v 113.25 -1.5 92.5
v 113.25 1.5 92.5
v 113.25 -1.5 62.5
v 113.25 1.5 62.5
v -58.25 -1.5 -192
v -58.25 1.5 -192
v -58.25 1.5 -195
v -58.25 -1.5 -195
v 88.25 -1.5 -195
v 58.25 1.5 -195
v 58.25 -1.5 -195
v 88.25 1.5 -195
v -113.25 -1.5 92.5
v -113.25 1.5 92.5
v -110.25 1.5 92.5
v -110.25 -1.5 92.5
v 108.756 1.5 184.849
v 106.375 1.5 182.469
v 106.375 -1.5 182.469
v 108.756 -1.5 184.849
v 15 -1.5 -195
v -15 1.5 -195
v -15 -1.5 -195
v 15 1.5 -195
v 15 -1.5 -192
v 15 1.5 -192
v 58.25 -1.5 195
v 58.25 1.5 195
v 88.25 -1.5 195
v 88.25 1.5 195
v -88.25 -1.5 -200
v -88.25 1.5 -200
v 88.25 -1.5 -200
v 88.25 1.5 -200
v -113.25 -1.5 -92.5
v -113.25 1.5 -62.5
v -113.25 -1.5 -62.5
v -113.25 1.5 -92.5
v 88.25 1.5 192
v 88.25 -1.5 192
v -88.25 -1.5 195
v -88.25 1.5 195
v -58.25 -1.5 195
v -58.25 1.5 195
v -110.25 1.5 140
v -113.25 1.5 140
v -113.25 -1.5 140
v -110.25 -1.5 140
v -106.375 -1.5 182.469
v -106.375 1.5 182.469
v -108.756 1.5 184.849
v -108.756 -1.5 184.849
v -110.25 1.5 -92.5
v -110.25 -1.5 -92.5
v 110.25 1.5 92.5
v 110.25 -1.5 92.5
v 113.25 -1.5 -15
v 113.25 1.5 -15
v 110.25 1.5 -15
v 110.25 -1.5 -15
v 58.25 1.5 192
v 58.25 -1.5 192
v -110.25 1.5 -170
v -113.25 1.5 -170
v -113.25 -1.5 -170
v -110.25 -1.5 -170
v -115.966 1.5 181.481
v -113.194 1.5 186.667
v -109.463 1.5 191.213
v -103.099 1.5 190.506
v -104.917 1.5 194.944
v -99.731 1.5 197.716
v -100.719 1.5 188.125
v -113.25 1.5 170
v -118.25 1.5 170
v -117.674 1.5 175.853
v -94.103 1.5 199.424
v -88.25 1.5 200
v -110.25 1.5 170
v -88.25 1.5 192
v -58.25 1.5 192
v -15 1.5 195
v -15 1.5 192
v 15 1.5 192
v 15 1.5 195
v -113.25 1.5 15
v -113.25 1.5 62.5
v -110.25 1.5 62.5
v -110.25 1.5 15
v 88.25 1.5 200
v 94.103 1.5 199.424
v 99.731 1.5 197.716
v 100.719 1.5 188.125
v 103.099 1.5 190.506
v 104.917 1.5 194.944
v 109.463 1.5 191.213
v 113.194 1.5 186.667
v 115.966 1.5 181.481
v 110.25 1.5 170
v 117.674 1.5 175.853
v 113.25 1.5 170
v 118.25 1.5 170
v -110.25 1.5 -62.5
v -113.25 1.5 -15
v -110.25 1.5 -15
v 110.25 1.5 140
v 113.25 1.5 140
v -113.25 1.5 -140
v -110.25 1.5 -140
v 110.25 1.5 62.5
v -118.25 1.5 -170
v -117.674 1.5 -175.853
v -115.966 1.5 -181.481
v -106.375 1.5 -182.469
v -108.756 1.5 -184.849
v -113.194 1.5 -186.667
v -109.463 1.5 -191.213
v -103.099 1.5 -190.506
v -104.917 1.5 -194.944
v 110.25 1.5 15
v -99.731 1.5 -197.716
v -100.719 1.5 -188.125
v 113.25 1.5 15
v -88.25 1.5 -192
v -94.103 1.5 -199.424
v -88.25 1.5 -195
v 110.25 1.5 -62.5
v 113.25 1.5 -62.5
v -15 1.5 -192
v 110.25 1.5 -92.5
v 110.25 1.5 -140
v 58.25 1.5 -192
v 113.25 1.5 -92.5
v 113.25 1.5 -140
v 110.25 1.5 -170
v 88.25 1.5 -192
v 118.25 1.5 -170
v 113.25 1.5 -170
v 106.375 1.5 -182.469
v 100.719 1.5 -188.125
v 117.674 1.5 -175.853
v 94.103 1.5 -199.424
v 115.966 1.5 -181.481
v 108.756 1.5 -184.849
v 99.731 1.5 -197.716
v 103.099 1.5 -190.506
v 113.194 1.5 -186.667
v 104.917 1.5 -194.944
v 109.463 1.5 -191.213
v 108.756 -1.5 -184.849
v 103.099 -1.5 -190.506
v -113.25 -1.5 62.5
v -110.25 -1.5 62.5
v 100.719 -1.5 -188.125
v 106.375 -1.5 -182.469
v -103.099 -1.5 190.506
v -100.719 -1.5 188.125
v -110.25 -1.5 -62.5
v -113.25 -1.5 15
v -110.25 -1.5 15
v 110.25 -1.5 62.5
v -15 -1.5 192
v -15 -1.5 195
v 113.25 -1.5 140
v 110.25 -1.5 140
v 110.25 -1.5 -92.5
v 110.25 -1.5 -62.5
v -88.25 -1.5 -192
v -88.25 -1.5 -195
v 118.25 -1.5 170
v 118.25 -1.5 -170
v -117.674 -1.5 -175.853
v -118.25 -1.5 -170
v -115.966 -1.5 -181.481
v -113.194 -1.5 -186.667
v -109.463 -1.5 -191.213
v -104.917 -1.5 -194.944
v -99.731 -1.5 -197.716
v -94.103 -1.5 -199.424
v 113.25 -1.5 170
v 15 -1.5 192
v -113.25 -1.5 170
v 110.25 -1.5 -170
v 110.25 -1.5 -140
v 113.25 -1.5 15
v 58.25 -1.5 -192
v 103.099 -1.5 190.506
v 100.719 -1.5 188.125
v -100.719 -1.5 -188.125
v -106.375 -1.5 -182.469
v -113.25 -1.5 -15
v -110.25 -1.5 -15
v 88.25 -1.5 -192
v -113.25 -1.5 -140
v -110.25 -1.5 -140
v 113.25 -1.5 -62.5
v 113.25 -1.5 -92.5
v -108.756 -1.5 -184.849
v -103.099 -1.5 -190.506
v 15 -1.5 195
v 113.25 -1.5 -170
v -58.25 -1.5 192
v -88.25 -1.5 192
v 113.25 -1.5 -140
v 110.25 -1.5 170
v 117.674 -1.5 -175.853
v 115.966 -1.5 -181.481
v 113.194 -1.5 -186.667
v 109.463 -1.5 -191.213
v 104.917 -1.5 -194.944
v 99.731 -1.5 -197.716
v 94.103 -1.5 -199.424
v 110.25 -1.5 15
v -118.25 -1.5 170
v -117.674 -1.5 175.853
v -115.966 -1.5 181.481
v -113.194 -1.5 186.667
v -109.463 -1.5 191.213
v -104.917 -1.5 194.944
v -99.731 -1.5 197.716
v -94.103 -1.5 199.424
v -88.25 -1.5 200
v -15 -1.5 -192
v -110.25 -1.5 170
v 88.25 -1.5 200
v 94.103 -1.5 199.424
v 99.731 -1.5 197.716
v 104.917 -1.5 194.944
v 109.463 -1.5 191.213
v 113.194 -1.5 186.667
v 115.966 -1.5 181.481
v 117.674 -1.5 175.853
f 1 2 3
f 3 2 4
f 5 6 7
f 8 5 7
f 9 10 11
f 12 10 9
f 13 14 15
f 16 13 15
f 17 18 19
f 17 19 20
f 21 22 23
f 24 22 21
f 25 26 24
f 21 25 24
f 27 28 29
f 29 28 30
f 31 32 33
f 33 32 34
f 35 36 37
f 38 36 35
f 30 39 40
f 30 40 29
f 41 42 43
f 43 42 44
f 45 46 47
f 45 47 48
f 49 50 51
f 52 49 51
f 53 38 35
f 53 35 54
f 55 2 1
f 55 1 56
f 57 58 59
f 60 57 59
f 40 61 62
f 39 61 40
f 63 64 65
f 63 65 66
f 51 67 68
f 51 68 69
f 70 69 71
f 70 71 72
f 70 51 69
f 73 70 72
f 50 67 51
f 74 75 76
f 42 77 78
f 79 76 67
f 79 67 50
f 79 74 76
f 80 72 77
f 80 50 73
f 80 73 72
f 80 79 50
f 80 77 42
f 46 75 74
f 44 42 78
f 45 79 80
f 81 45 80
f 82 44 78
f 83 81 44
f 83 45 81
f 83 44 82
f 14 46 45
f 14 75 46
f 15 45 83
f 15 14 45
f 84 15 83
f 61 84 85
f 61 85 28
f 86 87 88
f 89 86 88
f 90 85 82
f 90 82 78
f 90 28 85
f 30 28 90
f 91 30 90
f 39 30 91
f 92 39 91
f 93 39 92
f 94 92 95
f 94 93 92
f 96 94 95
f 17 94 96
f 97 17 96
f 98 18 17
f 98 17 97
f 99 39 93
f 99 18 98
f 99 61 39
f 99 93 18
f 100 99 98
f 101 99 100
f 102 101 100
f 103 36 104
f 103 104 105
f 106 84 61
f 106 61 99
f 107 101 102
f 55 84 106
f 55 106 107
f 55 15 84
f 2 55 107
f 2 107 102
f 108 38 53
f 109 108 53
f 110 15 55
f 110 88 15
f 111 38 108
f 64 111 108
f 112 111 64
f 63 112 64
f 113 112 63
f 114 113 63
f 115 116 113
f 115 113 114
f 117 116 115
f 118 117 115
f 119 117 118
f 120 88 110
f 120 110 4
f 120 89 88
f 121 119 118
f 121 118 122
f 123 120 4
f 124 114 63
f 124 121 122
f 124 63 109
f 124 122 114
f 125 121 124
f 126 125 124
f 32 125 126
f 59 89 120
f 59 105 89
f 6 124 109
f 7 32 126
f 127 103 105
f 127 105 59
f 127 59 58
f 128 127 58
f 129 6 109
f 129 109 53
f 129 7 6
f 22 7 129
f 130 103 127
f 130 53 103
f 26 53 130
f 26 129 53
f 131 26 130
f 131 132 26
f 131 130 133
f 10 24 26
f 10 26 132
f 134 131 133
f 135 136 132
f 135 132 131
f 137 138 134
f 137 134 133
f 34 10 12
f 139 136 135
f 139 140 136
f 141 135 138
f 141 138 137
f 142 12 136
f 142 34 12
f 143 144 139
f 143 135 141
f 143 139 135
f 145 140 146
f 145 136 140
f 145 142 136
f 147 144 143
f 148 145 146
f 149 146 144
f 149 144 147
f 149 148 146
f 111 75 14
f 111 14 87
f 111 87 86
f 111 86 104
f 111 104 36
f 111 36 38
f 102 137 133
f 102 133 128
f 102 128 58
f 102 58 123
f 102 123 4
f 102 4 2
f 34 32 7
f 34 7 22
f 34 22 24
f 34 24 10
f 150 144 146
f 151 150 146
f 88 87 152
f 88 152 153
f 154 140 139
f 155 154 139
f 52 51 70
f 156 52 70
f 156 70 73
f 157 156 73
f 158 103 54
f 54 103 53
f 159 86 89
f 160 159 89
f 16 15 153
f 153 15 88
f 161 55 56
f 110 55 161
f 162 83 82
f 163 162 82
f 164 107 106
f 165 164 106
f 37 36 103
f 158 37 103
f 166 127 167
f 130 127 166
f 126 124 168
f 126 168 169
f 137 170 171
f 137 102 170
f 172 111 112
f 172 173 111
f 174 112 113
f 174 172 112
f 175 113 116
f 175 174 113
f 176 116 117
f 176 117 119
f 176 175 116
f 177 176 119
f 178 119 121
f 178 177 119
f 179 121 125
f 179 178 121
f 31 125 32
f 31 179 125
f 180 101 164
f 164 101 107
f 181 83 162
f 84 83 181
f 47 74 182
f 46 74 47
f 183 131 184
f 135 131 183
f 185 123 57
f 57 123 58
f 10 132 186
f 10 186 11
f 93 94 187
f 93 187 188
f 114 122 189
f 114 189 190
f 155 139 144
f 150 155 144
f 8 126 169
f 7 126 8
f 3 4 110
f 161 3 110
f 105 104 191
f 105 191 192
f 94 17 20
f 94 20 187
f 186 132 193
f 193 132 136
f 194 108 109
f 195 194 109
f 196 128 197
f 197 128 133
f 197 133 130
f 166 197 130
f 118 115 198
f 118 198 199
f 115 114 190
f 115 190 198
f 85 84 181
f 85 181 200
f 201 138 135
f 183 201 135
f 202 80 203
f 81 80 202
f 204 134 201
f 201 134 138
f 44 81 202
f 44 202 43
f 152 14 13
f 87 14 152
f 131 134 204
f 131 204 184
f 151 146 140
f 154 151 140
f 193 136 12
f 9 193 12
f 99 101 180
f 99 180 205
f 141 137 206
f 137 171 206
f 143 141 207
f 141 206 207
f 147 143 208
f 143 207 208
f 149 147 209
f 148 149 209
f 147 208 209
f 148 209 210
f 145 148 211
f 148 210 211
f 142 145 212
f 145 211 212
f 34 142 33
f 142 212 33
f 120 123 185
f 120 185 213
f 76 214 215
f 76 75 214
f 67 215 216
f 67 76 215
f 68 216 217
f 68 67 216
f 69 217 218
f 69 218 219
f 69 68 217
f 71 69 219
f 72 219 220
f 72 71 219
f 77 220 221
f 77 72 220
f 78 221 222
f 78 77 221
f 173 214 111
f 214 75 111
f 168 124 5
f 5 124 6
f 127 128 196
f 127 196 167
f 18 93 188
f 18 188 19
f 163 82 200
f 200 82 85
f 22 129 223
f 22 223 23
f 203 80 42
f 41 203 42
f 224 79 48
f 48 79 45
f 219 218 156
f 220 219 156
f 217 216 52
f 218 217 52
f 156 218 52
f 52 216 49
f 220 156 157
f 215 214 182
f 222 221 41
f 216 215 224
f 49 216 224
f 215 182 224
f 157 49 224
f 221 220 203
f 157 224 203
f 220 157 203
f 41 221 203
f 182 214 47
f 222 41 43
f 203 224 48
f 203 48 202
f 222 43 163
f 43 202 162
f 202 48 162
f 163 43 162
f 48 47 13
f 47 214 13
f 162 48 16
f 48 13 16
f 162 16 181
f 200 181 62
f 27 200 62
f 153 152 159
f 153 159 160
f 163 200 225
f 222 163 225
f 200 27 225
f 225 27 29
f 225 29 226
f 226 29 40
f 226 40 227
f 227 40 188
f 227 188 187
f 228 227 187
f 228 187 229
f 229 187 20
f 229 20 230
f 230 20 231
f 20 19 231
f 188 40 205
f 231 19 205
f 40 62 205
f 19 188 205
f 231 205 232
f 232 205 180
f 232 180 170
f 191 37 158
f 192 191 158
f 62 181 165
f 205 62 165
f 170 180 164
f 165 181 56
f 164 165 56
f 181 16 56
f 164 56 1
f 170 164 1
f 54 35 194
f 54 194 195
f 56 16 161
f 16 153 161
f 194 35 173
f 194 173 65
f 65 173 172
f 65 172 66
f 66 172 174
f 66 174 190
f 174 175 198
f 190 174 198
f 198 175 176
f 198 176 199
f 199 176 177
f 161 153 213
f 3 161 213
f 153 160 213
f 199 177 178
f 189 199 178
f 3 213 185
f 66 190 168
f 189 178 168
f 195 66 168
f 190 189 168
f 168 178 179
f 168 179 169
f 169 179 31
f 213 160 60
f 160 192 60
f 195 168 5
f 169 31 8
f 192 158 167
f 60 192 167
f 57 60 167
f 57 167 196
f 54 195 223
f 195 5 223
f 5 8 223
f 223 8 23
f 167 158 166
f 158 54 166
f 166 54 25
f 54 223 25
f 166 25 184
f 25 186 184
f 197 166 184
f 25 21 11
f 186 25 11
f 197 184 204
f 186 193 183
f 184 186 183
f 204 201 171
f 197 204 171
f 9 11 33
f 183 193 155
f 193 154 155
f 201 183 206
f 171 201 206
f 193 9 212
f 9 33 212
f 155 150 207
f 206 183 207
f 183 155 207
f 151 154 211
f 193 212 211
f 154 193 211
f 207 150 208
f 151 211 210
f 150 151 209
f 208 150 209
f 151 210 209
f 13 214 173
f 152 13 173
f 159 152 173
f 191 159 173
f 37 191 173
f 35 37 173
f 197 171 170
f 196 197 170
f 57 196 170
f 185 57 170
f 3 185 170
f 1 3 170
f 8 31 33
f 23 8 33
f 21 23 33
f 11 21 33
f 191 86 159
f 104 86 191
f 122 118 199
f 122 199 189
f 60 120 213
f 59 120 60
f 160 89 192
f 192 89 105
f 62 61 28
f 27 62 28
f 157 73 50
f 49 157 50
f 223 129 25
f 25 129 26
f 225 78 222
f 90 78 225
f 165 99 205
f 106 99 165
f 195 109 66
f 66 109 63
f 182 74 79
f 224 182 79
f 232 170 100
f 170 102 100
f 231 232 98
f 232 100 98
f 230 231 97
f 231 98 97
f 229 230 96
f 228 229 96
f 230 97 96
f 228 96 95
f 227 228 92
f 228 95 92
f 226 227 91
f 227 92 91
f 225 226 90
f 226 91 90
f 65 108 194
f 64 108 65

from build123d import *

# Parameters (mm, degrees)
SKETCH1_W           = 236.5
SKETCH1_H           = 400
BOSS_EXTRUDE1_DEPTH = 1.5
FILLET1_R           = 30
SKETCH2_W           = 3
SKETCH2_H           = 30
CUT_EXTRUDE1_DEPTH  = 233.361921364
SKETCH3_W           = 30
SKETCH3_H           = 3
CUT_EXTRUDE2_DEPTH  = 233.361921364
CUT_EXTRUDE3_DEPTH  = 233.361921364


with BuildPart() as part:
    # Sketch1 → Boss-Extrude1 (new, symmetric)
    with BuildSketch(Plane(origin=(0, 0, 0), x_dir=(1, 0, 0), z_dir=(0, 1, 0))):
        Rectangle(SKETCH1_W, SKETCH1_H)
    extrude(amount=BOSS_EXTRUDE1_DEPTH, both=True)

    # Fillet1
    fillet1_edges = [part.edges().sort_by_distance(p)[0] for p in [
        (118.25, 0, 200),
        (-118.25, 0, 200),
        (-118.25, 0, -200),
        (118.25, 0, -200),
    ]]
    fillet(fillet1_edges, radius=FILLET1_R)

    # Sketch2 → Cut-Extrude1 (cut, through all)
    with BuildSketch(Plane(origin=(0, 1.5, 0), x_dir=(1, 0, 0), z_dir=(0, 1, 0))):
        with Locations((-111.75, -155)):
            Rectangle(SKETCH2_W, SKETCH2_H)
        with Locations((-111.75, -77.5)):
            Rectangle(SKETCH2_W, SKETCH2_H)
        with Locations((-111.75, 0)):
            Rectangle(SKETCH2_W, SKETCH2_H)
        with Locations((-111.75, 77.5)):
            Rectangle(SKETCH2_W, SKETCH2_H)
        with Locations((-111.75, 155)):
            Rectangle(SKETCH2_W, SKETCH2_H)
    cut_extrude1 = extrude(amount=-CUT_EXTRUDE1_DEPTH, mode=Mode.SUBTRACT)

    # Sketch3 → Cut-Extrude2 (cut, through all)
    with BuildSketch(Plane(origin=(0, 1.5, 0), x_dir=(1, 0, 0), z_dir=(0, 1, 0))):
        with Locations((-73.25, 193.5)):
            Rectangle(SKETCH3_W, SKETCH3_H)
        with Locations((0, 193.5)):
            Rectangle(SKETCH3_W, SKETCH3_H)
        with Locations((73.25, 193.5)):
            Rectangle(SKETCH3_W, SKETCH3_H)
    cut_extrude2 = extrude(amount=-CUT_EXTRUDE2_DEPTH, mode=Mode.SUBTRACT)

    # Mirror1: Cut-Extrude2 across plane
    add(cut_extrude2.mirror(Plane.XY), mode=Mode.SUBTRACT)

    # Mirror2: Cut-Extrude1 across plane
    add(cut_extrude1.mirror(Plane(origin=(0, 0, 0), x_dir=(0, 0, 1), z_dir=(1, 0, 0))), mode=Mode.SUBTRACT)

    # Sketch4 → Cut-Extrude3 (cut, through all)
    with BuildSketch(Plane(origin=(0, 1.5, 0), x_dir=(1, 0, 0), z_dir=(0, 1, 0))):
        Polygon((-108.756096654, 184.849242405), (-103.099242405, 190.506096654), (-100.718631416, 188.125485666), (-106.375485666, 182.468631416), align=None)
        Polygon((100.718631416, 188.125485666), (106.375485666, 182.468631416), (108.756096654, 184.849242405), (103.099242405, 190.506096654), align=None)
        Polygon((103.099242405, -190.506096654), (100.718631416, -188.125485666), (106.375485666, -182.468631416), (108.756096654, -184.849242405), align=None)
        Polygon((-100.718631416, -188.125485666), (-106.375485666, -182.468631416), (-108.756096654, -184.849242405), (-103.099242405, -190.506096654), align=None)
    extrude(amount=-CUT_EXTRUDE3_DEPTH, mode=Mode.SUBTRACT)


solid = part.part
